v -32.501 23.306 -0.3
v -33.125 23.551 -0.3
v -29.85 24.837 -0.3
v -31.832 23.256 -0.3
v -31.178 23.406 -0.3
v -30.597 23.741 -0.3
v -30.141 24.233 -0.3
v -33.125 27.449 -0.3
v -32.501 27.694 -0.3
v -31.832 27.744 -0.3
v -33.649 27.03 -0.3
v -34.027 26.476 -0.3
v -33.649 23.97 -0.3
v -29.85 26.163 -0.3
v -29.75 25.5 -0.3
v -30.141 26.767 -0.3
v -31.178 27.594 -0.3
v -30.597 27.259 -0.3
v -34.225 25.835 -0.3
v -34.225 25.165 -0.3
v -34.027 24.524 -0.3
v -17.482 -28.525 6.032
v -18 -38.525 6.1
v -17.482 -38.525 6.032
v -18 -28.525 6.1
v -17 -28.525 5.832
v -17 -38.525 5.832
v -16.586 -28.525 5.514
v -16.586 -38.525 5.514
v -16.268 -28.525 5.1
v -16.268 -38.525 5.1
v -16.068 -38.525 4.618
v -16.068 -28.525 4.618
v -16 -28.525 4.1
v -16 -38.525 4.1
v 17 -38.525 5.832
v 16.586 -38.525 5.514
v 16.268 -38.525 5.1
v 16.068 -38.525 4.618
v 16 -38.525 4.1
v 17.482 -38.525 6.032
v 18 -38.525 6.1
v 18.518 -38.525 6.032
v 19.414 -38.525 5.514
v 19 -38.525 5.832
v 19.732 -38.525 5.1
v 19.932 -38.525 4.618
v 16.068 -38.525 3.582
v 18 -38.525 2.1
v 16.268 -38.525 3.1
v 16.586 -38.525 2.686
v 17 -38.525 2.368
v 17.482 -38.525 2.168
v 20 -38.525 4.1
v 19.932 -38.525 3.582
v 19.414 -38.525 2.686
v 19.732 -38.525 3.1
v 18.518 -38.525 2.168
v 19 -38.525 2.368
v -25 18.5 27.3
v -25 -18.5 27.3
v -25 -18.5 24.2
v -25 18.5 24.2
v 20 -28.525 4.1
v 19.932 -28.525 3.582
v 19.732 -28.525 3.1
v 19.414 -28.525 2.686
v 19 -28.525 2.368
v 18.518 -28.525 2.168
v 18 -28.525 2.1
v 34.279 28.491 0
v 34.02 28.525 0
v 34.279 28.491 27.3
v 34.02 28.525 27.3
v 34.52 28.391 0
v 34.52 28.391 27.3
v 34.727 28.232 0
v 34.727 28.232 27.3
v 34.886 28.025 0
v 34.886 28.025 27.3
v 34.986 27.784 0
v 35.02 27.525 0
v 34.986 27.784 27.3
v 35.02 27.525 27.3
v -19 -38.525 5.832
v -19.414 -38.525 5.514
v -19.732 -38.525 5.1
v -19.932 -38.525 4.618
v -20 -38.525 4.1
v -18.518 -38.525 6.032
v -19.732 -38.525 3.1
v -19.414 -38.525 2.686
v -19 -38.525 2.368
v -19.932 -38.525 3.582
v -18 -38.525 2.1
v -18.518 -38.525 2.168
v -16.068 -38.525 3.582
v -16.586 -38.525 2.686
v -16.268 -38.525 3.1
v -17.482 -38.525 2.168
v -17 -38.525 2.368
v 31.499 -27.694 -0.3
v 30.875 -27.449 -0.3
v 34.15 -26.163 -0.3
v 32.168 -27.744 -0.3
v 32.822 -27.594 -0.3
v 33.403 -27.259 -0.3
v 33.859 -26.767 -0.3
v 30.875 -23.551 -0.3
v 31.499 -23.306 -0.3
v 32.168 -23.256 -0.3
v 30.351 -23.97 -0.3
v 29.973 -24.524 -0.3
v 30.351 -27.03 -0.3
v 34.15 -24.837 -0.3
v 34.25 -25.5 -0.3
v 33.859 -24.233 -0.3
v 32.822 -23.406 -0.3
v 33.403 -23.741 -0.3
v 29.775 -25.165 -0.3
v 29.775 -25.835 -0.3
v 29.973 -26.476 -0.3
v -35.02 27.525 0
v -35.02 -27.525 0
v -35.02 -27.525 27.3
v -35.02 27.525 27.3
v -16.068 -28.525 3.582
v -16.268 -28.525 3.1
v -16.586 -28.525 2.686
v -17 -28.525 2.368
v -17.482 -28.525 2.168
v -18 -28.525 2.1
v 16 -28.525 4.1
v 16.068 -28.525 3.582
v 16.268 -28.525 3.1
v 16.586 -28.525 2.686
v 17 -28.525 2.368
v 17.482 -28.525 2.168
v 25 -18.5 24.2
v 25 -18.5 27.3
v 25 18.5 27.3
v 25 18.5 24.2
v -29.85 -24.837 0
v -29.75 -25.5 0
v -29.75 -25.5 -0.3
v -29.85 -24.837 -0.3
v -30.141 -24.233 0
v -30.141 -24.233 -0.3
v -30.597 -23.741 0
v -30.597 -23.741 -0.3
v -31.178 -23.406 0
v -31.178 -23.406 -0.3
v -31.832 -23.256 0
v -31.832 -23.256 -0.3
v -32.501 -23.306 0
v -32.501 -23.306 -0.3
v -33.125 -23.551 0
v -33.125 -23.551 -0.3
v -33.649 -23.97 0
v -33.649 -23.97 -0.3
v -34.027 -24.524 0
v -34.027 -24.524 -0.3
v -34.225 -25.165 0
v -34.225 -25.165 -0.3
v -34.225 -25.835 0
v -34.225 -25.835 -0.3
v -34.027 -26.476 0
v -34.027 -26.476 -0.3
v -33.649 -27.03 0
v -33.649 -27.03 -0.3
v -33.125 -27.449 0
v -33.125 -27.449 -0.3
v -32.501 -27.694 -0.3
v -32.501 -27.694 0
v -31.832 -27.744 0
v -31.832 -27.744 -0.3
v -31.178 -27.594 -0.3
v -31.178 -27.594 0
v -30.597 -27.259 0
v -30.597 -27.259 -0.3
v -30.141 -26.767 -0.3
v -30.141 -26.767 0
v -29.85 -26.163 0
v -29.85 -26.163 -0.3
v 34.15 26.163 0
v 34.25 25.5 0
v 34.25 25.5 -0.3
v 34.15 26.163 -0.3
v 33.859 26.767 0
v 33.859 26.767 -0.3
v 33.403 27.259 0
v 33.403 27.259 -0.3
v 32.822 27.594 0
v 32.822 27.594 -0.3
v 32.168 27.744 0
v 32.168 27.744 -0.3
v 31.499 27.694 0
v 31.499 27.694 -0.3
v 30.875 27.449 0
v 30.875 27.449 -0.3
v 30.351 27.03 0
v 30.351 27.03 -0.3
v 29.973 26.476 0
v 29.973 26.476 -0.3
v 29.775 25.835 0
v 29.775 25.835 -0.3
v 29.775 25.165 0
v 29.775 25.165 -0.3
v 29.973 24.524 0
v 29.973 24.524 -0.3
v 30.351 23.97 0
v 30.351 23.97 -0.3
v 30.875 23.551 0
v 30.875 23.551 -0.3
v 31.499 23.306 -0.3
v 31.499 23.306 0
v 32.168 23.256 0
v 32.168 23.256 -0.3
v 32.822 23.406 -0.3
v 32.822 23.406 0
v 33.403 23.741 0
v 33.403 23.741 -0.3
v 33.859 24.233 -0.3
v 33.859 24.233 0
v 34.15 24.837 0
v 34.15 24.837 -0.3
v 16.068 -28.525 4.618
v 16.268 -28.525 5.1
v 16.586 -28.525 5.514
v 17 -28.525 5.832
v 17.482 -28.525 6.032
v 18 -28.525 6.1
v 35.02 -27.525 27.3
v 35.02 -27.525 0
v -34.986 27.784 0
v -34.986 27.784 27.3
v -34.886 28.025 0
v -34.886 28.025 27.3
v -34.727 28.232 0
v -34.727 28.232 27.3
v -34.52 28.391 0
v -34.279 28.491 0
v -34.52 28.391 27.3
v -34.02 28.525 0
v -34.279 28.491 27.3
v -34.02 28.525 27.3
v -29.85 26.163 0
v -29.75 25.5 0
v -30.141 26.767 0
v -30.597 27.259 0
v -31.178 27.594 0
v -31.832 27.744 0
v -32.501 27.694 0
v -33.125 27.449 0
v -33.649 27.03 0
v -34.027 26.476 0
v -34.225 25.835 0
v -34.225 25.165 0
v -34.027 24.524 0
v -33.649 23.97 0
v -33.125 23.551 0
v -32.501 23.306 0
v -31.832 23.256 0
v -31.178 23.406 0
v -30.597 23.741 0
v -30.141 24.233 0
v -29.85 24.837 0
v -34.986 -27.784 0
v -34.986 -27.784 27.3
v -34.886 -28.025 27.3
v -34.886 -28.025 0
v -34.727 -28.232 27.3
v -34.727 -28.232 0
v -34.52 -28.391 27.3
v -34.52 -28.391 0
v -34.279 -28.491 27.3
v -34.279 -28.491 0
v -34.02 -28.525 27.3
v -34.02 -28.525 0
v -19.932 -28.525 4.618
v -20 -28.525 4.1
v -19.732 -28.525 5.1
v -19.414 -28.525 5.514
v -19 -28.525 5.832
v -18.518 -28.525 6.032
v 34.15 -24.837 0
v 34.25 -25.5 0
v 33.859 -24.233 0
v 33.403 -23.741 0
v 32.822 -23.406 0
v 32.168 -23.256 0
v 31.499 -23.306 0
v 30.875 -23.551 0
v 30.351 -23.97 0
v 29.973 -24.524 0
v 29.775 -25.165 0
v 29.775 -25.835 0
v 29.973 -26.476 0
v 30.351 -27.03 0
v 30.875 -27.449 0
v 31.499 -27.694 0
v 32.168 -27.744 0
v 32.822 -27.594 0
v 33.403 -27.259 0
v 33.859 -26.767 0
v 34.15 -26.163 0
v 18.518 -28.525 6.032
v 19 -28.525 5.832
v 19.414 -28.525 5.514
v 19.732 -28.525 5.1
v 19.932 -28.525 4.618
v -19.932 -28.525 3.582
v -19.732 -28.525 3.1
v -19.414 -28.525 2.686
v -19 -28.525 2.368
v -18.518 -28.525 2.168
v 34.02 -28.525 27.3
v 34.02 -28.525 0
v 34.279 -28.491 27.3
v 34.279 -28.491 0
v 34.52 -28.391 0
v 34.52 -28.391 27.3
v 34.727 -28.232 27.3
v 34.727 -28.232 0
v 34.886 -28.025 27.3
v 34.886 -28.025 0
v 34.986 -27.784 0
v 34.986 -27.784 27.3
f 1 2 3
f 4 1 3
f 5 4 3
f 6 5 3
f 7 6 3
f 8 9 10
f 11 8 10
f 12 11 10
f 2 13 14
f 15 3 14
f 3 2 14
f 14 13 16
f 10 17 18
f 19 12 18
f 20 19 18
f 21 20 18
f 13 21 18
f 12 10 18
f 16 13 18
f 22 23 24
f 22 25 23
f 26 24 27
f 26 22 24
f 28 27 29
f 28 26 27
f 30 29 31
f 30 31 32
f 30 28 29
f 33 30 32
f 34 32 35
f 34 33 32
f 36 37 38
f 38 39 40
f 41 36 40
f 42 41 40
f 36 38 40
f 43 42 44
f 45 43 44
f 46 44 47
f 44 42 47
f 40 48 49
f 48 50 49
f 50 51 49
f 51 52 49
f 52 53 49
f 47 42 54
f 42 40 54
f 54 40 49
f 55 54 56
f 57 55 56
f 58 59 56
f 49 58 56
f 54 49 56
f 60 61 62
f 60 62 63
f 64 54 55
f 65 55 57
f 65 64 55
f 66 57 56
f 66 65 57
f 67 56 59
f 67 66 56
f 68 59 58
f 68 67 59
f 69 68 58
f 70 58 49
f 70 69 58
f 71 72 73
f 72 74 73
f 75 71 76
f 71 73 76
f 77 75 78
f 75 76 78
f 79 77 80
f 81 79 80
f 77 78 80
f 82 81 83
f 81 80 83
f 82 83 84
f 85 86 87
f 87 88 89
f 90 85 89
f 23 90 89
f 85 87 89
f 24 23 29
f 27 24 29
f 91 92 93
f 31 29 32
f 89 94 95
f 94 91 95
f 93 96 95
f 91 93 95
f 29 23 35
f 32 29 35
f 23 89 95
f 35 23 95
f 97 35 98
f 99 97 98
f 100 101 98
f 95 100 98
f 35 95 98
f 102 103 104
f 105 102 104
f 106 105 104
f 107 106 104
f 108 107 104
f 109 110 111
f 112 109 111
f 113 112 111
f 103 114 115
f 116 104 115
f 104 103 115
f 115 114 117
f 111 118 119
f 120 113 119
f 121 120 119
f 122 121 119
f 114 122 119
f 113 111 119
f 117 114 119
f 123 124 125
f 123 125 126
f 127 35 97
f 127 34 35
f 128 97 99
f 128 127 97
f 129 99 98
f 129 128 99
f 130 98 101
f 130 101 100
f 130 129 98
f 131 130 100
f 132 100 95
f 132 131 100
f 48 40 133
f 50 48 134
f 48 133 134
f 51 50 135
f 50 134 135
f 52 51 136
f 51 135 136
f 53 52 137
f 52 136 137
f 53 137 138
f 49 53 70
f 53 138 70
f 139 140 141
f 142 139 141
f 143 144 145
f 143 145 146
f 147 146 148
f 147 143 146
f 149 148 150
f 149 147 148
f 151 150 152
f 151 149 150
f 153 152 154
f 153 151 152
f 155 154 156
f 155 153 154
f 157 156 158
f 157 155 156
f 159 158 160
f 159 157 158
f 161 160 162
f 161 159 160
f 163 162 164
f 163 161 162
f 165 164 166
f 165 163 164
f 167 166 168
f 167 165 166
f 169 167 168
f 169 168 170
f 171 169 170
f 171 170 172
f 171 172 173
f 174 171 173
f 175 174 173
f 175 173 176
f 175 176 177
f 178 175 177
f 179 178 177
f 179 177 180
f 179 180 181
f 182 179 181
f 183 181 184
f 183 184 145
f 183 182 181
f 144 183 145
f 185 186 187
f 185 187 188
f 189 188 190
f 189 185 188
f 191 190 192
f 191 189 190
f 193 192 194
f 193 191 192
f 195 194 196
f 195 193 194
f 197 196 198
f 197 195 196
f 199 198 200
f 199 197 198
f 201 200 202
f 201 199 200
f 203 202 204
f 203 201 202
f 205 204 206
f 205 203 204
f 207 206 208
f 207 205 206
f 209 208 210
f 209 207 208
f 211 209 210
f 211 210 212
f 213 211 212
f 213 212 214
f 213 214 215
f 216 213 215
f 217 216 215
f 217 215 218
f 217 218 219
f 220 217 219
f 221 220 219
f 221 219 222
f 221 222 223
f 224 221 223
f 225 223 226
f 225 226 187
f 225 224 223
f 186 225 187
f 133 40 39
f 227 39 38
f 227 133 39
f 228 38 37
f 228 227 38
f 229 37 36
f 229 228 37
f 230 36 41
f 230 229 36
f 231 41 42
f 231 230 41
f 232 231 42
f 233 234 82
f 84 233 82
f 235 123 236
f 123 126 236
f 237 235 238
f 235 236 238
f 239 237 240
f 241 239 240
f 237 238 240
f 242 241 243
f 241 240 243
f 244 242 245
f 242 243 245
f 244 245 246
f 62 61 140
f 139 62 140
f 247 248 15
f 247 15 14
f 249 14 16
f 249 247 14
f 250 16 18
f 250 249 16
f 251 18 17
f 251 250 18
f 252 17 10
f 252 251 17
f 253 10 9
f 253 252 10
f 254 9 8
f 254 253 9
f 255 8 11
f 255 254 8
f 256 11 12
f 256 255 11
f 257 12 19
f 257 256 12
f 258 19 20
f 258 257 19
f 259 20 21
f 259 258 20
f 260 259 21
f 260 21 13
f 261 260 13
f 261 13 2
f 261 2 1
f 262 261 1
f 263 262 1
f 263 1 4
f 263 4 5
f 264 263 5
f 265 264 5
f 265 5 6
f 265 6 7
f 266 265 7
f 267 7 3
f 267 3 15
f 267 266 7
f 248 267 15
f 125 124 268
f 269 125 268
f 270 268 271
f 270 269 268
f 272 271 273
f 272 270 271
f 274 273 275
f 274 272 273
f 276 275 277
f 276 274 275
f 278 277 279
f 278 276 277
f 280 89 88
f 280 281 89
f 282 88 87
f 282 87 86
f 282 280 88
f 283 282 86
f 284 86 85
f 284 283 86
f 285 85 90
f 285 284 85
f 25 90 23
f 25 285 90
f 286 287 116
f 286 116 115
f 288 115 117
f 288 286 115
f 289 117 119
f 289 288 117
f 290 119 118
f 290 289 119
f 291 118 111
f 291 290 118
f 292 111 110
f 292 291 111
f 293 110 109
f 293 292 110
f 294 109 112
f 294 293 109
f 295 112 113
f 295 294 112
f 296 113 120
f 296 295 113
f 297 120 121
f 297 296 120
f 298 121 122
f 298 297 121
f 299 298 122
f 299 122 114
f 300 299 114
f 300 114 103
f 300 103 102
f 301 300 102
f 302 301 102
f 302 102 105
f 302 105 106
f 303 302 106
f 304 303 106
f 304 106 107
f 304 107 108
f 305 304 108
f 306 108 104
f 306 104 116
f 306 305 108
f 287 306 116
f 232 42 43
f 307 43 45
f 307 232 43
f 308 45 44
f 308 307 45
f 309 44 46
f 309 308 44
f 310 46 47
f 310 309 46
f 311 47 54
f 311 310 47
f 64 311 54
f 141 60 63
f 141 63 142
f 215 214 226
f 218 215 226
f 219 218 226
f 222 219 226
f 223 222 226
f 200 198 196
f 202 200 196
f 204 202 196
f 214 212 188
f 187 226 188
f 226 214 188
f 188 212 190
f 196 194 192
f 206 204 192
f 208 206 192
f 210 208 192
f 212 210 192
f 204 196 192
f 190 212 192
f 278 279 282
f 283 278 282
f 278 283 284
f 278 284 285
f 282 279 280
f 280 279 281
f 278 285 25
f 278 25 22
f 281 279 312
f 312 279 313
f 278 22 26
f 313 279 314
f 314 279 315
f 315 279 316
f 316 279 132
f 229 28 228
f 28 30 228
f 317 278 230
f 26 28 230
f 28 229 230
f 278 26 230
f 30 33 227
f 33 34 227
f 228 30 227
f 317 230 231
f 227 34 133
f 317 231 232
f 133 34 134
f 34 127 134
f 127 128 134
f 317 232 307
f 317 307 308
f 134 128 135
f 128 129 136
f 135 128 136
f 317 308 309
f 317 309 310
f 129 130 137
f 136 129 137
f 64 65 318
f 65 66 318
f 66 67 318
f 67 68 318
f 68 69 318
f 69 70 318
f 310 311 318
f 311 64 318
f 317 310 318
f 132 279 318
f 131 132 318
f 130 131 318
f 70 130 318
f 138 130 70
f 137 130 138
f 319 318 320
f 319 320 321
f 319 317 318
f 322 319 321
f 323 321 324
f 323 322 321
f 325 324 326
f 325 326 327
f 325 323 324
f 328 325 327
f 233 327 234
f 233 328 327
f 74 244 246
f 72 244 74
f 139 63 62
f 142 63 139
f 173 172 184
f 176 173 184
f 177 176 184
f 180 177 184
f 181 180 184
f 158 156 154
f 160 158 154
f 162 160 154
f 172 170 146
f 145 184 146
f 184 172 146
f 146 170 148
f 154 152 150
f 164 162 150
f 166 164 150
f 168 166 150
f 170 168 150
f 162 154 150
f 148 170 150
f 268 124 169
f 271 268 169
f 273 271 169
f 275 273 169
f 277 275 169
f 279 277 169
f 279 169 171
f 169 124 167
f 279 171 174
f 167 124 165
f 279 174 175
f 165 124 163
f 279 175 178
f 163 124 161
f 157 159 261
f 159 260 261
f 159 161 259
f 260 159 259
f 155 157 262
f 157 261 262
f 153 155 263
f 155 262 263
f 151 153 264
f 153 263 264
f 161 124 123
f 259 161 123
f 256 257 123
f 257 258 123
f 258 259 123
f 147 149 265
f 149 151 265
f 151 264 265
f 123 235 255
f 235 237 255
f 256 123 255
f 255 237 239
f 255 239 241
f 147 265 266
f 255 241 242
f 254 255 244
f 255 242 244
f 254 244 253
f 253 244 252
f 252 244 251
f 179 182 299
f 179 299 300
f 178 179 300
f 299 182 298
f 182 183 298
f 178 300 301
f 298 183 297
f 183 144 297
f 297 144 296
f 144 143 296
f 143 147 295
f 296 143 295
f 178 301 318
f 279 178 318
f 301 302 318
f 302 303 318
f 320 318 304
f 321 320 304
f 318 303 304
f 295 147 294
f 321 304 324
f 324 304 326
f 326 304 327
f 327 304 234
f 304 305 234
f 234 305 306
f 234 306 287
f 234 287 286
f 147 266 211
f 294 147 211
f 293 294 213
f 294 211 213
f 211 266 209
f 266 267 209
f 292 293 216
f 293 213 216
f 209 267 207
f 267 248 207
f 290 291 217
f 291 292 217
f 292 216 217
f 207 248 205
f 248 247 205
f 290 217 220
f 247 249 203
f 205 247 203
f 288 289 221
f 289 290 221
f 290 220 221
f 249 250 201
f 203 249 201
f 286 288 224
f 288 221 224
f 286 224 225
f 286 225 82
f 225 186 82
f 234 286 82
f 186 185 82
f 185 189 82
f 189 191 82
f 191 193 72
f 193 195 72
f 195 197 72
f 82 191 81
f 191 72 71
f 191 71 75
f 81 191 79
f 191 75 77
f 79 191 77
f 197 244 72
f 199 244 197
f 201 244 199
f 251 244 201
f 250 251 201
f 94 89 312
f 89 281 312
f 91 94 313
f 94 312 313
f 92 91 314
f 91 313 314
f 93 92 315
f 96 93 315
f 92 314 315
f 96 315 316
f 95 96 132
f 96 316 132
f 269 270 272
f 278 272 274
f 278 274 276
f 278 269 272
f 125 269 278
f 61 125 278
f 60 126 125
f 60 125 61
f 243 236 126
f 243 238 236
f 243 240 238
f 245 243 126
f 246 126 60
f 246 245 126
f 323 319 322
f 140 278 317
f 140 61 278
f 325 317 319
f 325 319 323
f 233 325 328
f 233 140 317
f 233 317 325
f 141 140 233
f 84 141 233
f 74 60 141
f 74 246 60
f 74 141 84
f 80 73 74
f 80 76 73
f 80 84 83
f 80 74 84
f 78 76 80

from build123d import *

# Parameters (mm, degrees)
MAIN_FEATURES_SKETCH_W   = 70.04
MAIN_FEATURES_SKETCH_H   = 57.05
MAIN_BODY_DEPTH          = 27.3
WIRES_START              = 2.1
MAIN_FEATURES_SKETCH_3_W = 4
MAIN_FEATURES_SKETCH_3_H = 10
WIRES_2_DEPTH            = 4
LENS_CUTOUT_START        = 27.3
MAIN_FEATURES_SKETCH_4_W = 50
MAIN_FEATURES_SKETCH_4_H = 37
LENS_CUTOUT_DEPTH        = 3.1
MAIN_FEATURES_SKETCH_5_R = 2.25
SCREW_HEADS_DEPTH        = 0.3
FILLET1_R                = 1
FILLET2_R                = 2


with BuildPart() as part:
    # main_features_sketch → main_body (new body)
    with BuildSketch(Plane.XY):
        Rectangle(MAIN_FEATURES_SKETCH_W, MAIN_FEATURES_SKETCH_H)
    extrude(amount=MAIN_BODY_DEPTH)

    # main_features_sketch<3> → wires 2 (add)
    with BuildSketch(Plane.XY.offset(WIRES_START)):
        with Locations((-18, -33.525)):
            Rectangle(MAIN_FEATURES_SKETCH_3_W, MAIN_FEATURES_SKETCH_3_H)
        with Locations((18, -33.525)):
            Rectangle(MAIN_FEATURES_SKETCH_3_W, MAIN_FEATURES_SKETCH_3_H)
    extrude(amount=WIRES_2_DEPTH)

    # main_features_sketch<4> → lens_cutout (cut)
    with BuildSketch(Plane.XY.offset(LENS_CUTOUT_START)):
        Rectangle(MAIN_FEATURES_SKETCH_4_W, MAIN_FEATURES_SKETCH_4_H)
    extrude(amount=-LENS_CUTOUT_DEPTH, mode=Mode.SUBTRACT)

    # main_features_sketch<5> → screw_heads (add)
    with BuildSketch(Plane.XY):
        with Locations((-32, -25.5)):
            Circle(MAIN_FEATURES_SKETCH_5_R)
        with Locations((32, -25.5)):
            Circle(MAIN_FEATURES_SKETCH_5_R)
        with Locations((32, 25.5)):
            Circle(MAIN_FEATURES_SKETCH_5_R)
        with Locations((-32, 25.5)):
            Circle(MAIN_FEATURES_SKETCH_5_R)
    extrude(amount=-SCREW_HEADS_DEPTH)

    # Fillet1
    fillet1_edges = [part.edges().sort_by_distance(p)[0] for p in [
        (35.02, 28.525, 13.65),
        (35.02, -28.525, 13.65),
        (-35.02, -28.525, 13.65),
        (-35.02, 28.525, 13.65),
    ]]
    fillet(fillet1_edges, radius=FILLET1_R)

    # Fillet2
    fillet2_edges = [part.edges().sort_by_distance(p)[0] for p in [
        (20, -33.525, 2.1),
        (20, -33.525, 6.1),
        (16, -33.525, 2.1),
        (16, -33.525, 6.1),
        (-16, -33.525, 2.1),
        (-16, -33.525, 6.1),
        (-20, -33.525, 2.1),
        (-20, -33.525, 6.1),
    ]]
    fillet(fillet2_edges, radius=FILLET2_R - 0.0001)  # a hair under: the kernel refuses the full size


solid = part.part
